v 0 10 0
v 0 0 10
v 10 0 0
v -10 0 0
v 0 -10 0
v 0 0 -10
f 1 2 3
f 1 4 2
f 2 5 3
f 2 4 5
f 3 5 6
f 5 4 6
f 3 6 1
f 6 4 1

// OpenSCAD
/*
Exercício 1
Crie um octoedro regular com diagonal 20.
*/

//Qualquer secção do octaedro que passe por 4 vertices é um quadrado.

D = 20; //Diagonal do quadrado
for (i = [0,180]){
    rotate([i,0,0])
        cylinder(d1=D, r2=0, h=D/2, $fn=4);
}
